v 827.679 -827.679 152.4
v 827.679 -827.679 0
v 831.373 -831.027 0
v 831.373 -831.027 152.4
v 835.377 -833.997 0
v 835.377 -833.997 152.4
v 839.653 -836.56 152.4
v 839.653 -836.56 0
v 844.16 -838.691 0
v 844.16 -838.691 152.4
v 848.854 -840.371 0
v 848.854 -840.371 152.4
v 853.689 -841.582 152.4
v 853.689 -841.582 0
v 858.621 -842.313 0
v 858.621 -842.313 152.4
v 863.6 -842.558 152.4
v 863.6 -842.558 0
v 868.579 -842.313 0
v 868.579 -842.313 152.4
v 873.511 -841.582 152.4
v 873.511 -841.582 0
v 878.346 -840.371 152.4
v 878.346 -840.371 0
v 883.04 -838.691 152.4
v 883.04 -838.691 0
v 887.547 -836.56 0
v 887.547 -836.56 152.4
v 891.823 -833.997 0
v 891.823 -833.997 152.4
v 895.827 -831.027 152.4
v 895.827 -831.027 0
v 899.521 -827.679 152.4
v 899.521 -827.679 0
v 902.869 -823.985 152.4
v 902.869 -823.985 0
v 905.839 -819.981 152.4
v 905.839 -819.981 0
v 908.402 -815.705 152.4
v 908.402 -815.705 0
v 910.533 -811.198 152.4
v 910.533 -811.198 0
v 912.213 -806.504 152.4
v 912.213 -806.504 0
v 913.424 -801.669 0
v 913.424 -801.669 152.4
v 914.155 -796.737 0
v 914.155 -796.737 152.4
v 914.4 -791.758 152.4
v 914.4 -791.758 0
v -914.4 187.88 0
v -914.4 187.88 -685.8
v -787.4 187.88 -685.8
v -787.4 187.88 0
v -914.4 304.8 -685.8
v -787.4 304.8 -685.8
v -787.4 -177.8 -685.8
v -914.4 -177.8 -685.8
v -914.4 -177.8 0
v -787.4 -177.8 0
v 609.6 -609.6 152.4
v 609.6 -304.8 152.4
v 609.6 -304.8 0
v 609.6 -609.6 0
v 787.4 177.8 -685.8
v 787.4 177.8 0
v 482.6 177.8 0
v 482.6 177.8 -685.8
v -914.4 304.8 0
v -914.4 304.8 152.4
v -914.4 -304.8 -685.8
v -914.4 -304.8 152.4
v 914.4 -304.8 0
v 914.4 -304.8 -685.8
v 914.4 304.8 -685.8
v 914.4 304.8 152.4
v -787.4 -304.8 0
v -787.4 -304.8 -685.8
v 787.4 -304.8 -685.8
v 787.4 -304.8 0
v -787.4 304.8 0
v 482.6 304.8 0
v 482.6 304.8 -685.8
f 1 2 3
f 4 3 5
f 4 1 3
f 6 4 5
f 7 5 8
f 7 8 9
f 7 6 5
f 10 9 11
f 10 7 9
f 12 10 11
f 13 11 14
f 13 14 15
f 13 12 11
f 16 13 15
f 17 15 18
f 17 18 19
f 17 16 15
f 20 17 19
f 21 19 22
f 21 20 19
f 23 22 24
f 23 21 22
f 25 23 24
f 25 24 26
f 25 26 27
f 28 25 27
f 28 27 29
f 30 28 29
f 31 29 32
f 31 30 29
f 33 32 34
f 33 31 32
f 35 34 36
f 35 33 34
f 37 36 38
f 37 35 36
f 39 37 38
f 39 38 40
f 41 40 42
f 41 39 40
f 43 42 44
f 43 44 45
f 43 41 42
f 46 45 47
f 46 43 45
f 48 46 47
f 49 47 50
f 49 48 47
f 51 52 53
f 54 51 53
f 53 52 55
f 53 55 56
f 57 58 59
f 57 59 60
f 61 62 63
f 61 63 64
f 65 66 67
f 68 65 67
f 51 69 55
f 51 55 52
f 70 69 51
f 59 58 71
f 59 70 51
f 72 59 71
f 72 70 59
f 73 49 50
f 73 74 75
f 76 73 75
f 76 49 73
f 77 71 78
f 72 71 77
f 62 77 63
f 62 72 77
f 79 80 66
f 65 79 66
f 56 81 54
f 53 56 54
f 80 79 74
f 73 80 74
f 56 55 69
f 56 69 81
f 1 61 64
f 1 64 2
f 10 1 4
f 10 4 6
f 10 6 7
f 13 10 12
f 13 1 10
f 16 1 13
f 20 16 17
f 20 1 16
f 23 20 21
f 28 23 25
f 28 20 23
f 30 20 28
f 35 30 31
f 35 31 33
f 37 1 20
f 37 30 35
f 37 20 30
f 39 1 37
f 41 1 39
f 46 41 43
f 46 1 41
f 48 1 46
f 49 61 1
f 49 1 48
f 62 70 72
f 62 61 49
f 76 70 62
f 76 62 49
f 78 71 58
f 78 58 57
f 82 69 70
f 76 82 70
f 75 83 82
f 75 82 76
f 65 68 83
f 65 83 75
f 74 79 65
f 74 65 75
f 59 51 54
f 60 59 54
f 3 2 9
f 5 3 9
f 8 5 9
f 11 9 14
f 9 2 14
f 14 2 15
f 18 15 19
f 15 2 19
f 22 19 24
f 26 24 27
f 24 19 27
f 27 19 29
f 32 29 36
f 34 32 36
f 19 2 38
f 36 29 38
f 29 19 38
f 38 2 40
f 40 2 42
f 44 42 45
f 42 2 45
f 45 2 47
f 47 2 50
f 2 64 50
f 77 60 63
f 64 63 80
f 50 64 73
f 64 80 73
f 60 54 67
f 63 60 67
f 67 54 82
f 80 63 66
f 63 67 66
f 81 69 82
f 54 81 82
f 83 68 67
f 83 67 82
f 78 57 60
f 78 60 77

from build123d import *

# Parameters (mm, degrees)
F0_W     = 1828.8
F0_H     = 609.6
F1_DEPTH = 152.4
F2_W     = 127
F2_H     = 127
F2_H_2   = 116.919603
F3_DEPTH = 685.8
F5_DEPTH = 152.4


with BuildPart() as f1:
    # F0 (on Top) → F1 (new body)
    with BuildSketch(Plane.XY):
        Rectangle(F0_W, F0_H)
    extrude(amount=F1_DEPTH)

    # F2 (on face) → F3 (join)
    with BuildSketch(Plane(origin=(0, 0, 0), x_dir=(1, 0, 0), z_dir=(0, 0, -1))):
        with Locations((-850.9, 241.3)):
            Rectangle(F2_W, F2_H)
        with Locations((-850.9, -246.340198)):
            Rectangle(F2_W, F2_H_2)
        Polygon((787.4, -304.8), (914.4, -304.8), (914.4, 177.8), (914.4, 304.8), (787.4, 304.8), (787.4, -177.8), (482.6, -177.8), (482.6, -304.8), align=None)
    extrude(amount=F3_DEPTH)

    # F4 (on face) → F5 (join, through all)
    with BuildSketch(Plane.XY.offset(152.4)):
        with BuildLine():
            Line((914.4, -791.757951), (914.4, -304.8))
            Line((914.4, -304.8), (609.6, -304.8))
            Line((609.6, -304.8), (609.6, -609.6))
            Line((609.6, -609.6), (827.678976, -827.678976))
            ThreePointArc((827.678976, -827.678976), (883.040318, -838.691031), (914.4, -791.757951))
        make_face()
    extrude(amount=-F5_DEPTH)


solid = f1.part
